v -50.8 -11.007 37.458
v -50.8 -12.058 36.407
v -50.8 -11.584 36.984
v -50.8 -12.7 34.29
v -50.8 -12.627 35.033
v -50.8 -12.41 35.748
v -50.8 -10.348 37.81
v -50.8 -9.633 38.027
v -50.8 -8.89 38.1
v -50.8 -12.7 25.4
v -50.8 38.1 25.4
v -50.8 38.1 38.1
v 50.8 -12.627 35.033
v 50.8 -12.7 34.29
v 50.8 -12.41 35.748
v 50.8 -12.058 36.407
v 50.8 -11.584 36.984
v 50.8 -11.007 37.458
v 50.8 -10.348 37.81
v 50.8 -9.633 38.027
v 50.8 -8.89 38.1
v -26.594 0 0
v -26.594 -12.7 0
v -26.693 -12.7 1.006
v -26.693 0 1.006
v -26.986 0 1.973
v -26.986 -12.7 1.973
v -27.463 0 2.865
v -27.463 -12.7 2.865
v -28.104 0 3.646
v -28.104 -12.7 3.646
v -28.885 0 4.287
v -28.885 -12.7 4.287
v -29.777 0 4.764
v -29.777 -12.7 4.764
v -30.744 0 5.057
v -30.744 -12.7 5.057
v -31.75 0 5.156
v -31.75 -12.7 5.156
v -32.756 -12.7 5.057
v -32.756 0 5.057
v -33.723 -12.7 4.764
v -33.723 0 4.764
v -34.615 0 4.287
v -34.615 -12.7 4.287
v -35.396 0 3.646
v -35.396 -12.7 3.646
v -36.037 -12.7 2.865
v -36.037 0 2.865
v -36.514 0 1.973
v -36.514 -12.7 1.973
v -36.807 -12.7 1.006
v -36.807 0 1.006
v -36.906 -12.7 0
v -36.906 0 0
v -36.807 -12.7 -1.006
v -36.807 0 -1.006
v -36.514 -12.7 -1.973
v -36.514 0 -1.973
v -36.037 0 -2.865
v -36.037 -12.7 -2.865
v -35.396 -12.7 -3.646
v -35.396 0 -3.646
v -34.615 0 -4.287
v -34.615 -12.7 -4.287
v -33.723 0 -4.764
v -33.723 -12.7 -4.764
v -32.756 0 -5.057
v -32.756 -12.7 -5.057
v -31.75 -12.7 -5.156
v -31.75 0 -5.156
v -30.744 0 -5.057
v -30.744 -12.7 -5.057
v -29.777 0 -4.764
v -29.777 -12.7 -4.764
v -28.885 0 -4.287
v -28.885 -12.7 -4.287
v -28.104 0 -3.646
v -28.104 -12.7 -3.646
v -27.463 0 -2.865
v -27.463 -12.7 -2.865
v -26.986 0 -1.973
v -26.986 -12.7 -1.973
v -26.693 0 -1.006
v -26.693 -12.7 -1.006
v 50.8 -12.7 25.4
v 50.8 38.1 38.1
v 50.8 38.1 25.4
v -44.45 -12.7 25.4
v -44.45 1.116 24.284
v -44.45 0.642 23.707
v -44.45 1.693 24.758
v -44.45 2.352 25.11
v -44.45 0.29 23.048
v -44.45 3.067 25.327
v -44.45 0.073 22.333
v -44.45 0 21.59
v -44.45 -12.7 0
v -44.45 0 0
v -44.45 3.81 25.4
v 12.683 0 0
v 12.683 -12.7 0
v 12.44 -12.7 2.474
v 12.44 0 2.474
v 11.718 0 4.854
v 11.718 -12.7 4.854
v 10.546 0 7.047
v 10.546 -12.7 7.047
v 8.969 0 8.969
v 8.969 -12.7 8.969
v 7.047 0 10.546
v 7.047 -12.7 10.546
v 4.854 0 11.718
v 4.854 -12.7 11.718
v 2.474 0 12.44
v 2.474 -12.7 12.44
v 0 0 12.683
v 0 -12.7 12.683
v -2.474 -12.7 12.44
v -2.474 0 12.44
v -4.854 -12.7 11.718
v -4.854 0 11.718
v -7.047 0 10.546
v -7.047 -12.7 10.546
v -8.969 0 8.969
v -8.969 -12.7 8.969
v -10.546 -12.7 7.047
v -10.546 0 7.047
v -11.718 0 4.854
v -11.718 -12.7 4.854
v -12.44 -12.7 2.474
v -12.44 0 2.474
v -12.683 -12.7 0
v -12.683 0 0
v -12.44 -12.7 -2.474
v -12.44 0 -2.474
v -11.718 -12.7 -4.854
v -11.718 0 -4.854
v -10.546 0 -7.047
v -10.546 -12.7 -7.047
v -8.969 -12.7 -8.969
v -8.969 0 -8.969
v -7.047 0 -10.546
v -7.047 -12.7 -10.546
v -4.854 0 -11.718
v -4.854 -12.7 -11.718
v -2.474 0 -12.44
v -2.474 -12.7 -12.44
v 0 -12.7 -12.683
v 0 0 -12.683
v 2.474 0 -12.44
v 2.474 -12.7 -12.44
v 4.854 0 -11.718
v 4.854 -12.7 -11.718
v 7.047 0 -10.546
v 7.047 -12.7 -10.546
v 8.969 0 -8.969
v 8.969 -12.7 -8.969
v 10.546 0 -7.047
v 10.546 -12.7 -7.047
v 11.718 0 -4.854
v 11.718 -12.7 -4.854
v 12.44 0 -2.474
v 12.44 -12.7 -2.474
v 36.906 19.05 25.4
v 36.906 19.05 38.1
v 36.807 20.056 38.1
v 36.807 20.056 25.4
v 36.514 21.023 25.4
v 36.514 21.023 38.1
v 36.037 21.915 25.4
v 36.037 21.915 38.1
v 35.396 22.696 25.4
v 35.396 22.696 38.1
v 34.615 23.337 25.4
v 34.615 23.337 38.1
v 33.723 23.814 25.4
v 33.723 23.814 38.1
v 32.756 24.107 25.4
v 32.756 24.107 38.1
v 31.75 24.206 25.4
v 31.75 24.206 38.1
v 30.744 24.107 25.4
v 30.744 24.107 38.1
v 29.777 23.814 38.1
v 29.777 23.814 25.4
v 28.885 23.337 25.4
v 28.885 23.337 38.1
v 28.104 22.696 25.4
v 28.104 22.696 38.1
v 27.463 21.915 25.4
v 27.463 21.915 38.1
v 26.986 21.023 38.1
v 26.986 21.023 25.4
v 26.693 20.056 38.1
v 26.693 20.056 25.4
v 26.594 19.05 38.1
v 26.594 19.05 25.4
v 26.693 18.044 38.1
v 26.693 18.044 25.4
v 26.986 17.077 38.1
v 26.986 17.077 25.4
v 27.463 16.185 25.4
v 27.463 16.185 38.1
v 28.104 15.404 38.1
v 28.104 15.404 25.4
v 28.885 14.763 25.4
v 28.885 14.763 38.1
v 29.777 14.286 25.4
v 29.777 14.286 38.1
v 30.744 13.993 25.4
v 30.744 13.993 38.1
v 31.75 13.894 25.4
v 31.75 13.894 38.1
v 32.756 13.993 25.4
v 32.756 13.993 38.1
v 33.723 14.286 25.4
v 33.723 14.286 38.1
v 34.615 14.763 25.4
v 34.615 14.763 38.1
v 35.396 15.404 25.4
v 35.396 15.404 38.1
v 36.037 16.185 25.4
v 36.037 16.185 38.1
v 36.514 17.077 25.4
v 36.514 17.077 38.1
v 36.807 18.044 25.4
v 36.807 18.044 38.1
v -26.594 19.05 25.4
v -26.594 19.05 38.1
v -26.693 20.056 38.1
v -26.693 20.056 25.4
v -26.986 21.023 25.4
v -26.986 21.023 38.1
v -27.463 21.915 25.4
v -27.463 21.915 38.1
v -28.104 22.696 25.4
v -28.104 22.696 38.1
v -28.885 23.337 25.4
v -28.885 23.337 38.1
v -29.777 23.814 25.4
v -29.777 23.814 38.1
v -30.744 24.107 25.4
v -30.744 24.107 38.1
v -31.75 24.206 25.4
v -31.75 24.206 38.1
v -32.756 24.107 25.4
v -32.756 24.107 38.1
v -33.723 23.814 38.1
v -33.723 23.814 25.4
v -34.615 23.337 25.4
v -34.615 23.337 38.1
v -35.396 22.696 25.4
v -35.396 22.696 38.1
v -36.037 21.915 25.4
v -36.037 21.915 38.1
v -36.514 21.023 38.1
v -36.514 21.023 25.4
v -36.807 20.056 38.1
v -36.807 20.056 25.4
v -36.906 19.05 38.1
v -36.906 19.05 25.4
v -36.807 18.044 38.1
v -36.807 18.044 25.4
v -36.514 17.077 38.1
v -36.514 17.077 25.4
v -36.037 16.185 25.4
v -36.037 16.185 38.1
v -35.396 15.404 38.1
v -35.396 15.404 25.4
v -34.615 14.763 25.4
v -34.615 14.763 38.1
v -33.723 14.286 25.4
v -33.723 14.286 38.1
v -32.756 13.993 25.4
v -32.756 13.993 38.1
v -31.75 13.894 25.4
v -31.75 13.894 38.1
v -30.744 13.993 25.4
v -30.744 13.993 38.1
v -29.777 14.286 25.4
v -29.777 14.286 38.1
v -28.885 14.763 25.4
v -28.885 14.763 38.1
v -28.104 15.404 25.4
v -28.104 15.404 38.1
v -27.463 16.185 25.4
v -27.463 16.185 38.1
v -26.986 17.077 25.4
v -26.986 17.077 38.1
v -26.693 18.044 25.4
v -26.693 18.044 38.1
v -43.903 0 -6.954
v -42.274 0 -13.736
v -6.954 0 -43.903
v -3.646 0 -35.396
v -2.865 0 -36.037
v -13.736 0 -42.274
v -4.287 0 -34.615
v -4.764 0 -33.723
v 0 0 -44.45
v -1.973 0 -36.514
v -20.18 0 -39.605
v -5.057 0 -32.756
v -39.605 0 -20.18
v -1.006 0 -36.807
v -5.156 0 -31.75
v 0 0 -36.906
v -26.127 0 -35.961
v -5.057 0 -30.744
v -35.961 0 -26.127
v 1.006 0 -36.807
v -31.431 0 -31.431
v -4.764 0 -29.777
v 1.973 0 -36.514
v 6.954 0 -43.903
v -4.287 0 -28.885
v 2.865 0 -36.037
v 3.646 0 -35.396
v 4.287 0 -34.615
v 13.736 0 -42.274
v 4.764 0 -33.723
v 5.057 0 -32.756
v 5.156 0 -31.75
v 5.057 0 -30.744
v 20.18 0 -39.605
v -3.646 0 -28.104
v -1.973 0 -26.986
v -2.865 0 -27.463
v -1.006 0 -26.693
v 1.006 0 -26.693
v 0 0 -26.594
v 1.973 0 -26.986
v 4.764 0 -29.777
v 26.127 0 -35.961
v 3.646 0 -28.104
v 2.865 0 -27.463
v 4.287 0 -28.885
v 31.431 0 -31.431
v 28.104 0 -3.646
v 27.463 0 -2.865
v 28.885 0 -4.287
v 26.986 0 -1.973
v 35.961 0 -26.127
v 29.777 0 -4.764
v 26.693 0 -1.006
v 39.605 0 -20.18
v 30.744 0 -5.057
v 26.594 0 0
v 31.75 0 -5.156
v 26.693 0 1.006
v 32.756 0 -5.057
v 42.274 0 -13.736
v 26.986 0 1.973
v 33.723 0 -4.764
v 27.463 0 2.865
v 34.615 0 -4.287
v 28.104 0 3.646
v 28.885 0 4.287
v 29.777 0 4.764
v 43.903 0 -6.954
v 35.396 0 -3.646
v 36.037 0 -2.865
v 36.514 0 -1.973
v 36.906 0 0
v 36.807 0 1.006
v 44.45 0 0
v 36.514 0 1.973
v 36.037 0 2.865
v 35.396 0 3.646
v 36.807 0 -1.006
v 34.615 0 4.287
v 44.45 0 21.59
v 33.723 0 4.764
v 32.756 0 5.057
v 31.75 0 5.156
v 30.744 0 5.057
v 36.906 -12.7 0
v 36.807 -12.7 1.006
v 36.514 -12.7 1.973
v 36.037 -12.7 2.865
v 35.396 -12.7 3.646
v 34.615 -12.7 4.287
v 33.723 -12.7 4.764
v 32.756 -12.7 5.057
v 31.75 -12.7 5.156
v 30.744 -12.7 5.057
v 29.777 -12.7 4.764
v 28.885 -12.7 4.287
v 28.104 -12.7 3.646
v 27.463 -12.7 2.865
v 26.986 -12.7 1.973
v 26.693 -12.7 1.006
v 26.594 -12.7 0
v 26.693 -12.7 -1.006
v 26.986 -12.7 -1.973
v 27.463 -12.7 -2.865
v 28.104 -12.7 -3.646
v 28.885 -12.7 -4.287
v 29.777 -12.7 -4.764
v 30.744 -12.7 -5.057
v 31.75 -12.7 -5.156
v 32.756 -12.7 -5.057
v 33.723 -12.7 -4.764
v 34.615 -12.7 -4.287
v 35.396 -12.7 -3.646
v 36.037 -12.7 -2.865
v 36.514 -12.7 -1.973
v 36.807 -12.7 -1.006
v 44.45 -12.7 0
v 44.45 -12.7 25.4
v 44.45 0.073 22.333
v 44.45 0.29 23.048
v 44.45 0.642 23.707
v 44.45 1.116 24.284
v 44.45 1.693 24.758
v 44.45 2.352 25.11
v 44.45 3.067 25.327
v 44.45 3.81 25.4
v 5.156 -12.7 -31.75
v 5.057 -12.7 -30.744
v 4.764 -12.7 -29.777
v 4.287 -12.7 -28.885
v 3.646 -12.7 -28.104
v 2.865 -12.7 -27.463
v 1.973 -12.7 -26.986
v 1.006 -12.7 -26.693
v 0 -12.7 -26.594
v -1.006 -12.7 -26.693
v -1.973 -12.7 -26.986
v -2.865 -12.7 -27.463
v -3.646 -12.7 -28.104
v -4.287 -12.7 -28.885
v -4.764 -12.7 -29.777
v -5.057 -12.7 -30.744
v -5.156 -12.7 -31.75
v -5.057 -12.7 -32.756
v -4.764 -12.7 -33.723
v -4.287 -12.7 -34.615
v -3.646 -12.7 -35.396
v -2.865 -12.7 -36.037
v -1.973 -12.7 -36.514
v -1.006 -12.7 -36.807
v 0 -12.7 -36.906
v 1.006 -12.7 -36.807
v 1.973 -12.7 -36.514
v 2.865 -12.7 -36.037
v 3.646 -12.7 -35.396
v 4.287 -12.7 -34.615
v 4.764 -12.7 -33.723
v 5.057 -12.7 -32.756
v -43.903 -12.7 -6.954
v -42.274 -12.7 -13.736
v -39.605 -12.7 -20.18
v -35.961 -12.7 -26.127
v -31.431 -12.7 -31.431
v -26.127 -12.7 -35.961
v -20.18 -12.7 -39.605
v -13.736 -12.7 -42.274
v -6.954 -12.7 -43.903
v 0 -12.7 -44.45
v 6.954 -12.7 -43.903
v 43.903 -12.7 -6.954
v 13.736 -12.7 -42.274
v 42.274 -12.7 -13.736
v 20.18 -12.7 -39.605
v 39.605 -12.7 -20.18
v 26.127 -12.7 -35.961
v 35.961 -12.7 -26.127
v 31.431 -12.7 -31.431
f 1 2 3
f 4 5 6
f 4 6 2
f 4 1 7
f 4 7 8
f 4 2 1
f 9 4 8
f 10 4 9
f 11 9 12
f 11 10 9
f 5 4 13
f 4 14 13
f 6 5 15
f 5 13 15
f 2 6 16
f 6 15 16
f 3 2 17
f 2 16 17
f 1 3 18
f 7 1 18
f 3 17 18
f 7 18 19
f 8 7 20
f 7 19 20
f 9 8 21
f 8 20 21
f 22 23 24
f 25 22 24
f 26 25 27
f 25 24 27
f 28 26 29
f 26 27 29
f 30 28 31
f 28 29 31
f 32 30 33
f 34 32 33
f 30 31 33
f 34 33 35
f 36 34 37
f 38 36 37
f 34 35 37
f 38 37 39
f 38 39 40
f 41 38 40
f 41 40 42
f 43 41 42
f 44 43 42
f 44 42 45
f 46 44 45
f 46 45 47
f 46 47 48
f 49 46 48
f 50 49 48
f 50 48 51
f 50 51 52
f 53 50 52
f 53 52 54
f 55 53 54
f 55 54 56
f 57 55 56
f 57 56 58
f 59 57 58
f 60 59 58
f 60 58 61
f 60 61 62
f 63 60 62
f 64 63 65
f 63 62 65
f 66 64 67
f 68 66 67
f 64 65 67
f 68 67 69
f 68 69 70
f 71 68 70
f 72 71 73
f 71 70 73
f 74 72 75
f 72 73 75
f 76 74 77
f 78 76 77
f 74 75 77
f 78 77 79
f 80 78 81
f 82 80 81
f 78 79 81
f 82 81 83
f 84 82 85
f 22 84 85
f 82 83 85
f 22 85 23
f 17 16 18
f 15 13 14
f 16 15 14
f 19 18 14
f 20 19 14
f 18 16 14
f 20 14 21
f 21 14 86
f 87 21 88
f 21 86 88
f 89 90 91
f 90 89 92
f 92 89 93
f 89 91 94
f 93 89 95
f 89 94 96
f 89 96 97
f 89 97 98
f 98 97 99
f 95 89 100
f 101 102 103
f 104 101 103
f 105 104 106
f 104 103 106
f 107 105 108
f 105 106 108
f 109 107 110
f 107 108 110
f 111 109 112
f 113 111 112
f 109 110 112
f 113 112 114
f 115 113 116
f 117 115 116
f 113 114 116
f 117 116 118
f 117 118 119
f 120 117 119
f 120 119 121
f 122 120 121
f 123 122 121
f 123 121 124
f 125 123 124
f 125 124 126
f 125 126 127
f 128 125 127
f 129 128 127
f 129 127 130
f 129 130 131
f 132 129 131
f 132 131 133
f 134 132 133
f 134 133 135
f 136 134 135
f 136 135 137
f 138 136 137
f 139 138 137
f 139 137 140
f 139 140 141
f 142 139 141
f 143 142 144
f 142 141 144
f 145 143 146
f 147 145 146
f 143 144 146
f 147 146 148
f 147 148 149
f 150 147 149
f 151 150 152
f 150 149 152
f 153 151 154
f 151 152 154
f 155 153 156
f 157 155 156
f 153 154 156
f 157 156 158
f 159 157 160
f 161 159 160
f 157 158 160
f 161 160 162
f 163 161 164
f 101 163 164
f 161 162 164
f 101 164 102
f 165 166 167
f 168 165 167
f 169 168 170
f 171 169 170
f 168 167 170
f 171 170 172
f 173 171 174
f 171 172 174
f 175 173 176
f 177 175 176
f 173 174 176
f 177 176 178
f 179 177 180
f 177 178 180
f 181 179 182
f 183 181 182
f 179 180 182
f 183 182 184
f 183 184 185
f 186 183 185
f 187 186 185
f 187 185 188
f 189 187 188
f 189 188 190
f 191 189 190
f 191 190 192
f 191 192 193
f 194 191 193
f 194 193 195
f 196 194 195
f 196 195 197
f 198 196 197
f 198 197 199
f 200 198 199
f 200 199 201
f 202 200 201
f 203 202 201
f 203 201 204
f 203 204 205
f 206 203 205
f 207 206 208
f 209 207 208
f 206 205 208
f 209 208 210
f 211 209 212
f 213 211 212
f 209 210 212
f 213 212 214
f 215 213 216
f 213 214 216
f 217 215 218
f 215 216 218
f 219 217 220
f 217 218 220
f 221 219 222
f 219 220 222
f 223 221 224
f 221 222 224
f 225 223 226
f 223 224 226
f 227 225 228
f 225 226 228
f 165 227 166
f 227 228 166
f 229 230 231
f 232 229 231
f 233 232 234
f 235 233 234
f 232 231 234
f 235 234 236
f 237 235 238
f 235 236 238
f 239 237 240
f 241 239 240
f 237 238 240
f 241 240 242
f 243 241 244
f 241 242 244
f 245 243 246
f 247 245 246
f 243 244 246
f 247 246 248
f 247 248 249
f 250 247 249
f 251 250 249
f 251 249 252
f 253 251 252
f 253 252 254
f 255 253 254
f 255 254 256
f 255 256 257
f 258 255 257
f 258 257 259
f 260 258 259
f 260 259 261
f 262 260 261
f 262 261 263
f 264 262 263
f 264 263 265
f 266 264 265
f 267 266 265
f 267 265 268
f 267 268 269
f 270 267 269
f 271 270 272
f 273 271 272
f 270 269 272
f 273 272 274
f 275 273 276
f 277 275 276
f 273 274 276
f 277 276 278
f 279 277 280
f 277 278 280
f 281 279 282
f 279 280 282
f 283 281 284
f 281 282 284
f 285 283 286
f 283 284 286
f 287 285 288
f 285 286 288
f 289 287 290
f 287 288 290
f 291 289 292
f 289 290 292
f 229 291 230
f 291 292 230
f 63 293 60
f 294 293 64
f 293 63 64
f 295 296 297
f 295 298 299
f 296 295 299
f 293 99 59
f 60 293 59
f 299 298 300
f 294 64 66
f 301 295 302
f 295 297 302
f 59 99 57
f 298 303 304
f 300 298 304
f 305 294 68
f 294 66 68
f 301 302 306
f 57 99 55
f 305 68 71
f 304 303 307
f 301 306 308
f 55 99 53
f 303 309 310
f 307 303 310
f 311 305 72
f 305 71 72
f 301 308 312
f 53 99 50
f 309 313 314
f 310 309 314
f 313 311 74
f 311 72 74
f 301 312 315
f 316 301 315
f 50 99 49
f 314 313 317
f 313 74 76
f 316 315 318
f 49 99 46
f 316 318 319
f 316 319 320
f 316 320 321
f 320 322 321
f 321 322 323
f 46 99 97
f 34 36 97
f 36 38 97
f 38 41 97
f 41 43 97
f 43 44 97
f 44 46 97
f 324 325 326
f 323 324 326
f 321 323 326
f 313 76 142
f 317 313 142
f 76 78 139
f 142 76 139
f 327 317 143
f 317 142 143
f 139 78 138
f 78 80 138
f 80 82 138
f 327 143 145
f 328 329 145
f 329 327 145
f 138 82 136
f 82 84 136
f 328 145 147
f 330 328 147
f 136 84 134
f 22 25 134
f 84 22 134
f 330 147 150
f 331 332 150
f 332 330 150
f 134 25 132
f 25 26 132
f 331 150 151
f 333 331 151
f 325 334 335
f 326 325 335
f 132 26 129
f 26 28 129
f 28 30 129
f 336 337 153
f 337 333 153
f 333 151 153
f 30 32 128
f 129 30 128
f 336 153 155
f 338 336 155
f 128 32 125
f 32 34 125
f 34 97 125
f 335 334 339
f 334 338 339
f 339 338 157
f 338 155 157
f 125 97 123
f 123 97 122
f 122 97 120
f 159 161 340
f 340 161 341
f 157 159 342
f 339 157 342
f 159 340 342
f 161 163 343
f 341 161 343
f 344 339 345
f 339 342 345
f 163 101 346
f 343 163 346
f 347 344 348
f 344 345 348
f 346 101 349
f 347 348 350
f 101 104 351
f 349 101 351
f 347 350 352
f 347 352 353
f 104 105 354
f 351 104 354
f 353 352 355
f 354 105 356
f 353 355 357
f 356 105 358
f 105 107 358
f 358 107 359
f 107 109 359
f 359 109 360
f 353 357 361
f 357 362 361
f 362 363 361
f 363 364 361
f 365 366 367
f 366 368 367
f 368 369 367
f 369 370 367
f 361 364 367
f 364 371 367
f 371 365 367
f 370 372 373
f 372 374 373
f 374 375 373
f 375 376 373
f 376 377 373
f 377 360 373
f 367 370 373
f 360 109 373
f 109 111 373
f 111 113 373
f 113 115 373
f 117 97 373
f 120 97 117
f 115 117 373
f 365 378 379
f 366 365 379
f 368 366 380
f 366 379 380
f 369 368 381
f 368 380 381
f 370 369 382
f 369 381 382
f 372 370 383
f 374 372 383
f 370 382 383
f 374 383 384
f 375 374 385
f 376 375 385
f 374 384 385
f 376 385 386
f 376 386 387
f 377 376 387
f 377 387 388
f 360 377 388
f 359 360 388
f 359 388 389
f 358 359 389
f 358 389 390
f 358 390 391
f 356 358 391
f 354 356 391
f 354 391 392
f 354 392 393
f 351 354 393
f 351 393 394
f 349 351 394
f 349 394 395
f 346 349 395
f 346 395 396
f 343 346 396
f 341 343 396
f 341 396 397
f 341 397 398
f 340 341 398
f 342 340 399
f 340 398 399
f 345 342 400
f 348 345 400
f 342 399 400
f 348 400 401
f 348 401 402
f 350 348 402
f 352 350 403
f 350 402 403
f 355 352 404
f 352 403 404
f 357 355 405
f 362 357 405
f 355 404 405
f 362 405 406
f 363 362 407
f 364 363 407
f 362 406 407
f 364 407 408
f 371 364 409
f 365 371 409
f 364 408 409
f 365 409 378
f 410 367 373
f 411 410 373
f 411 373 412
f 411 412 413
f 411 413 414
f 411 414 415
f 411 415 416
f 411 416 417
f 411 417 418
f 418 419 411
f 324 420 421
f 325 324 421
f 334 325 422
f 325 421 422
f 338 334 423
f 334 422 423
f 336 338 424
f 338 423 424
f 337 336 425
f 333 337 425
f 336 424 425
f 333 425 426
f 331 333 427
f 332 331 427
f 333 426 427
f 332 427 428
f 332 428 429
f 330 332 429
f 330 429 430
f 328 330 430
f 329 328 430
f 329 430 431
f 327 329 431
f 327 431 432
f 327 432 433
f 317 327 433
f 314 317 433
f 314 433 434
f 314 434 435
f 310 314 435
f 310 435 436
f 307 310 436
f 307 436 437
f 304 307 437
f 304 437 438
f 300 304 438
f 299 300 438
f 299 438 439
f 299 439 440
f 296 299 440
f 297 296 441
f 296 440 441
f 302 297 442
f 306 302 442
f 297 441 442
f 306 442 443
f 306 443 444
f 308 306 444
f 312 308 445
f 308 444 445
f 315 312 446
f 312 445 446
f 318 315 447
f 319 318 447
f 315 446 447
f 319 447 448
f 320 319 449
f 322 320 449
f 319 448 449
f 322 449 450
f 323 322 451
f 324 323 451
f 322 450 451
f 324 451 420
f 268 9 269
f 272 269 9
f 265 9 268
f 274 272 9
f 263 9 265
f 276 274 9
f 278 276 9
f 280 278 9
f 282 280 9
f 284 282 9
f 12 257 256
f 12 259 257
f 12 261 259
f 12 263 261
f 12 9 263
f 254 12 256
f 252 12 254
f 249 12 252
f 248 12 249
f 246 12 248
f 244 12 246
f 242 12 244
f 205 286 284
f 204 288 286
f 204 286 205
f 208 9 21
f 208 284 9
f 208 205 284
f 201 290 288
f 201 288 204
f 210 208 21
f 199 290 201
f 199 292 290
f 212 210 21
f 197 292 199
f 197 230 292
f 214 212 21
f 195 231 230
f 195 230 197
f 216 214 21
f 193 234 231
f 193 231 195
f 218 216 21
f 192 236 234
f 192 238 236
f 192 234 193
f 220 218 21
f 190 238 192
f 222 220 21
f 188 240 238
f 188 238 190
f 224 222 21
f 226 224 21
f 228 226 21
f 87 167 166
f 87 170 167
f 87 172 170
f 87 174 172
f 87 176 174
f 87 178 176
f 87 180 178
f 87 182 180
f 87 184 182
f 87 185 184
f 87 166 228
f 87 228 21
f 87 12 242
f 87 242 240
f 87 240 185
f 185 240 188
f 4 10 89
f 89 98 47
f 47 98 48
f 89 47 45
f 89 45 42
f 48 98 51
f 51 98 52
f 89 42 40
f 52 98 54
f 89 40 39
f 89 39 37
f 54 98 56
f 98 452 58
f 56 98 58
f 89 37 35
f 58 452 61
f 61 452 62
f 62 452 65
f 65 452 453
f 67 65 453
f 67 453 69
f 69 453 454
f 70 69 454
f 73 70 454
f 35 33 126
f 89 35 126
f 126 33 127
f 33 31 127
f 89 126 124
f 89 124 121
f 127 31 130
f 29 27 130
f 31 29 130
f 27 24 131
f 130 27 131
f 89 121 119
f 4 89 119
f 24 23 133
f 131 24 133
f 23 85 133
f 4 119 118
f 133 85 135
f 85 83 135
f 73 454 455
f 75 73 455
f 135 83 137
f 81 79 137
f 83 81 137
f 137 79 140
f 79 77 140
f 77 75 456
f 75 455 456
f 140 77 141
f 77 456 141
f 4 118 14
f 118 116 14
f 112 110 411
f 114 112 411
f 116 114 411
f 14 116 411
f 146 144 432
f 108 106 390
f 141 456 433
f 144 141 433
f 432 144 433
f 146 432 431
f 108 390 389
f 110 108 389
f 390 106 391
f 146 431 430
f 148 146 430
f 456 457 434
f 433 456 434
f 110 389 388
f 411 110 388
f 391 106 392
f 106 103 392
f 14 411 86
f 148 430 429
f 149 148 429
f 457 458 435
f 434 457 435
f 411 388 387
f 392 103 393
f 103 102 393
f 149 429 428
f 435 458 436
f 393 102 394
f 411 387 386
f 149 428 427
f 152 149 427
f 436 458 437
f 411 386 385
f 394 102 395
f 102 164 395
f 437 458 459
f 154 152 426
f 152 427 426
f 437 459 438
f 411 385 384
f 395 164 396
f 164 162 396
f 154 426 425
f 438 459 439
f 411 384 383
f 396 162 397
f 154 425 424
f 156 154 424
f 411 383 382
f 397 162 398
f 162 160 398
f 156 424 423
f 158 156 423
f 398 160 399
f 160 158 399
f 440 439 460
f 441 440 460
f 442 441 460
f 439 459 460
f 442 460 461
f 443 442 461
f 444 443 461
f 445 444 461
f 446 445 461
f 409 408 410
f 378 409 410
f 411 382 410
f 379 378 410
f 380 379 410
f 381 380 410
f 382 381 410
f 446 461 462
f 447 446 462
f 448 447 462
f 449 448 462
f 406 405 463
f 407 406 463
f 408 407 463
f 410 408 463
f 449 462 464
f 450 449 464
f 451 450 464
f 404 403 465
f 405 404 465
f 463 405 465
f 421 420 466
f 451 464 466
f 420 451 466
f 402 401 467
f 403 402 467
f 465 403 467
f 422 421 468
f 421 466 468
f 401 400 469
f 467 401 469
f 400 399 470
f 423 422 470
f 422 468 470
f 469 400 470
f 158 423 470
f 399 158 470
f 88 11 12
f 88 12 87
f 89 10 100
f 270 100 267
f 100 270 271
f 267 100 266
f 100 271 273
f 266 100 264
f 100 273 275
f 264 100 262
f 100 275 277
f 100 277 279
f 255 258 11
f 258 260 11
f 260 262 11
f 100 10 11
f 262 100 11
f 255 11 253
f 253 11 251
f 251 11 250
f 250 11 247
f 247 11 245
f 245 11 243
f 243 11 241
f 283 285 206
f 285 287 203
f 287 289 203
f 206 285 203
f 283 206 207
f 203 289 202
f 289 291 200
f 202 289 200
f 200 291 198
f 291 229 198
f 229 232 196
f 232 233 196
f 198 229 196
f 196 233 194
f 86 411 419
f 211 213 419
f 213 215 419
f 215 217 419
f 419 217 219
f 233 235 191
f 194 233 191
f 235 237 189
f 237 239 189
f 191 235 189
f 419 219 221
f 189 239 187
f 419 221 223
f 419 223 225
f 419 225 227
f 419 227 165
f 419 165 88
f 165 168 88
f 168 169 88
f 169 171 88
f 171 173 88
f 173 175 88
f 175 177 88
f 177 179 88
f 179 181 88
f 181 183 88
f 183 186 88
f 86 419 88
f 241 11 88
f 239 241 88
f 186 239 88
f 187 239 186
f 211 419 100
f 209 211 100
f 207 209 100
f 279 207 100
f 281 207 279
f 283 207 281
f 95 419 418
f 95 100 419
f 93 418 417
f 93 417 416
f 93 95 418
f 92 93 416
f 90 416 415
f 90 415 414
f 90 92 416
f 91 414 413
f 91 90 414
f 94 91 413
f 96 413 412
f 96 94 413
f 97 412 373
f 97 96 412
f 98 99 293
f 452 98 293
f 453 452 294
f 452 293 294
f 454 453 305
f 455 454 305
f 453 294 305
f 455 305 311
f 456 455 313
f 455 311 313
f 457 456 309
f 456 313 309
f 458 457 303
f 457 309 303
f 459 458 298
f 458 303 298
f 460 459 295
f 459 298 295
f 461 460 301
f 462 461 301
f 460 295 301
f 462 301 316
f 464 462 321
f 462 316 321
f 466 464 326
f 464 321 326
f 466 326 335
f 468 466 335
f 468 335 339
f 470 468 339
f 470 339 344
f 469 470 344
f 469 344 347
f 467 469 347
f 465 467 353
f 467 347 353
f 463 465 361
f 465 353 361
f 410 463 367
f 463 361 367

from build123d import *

# Parameters (mm, degrees)
F1_DEPTH = 12.7
F2_W     = 101.6
F2_H     = 50.8
F3_DEPTH = 12.7
F4_R     = 12.68349
F5_DEPTH = 25.4
F6_R     = 5.1562
F7_DEPTH = 25.4
F8_R     = 5.1562
F9_DEPTH = 25.4
F10_R    = 3.81


with BuildPart() as f1:
    # F0 (on Front) → F1 (new body)
    with BuildSketch(Plane.XZ):
        with BuildLine():
            Line((-44.45, 25.4), (-44.45, 0))
            ThreePointArc((-44.45, 0), (0, -44.45), (44.45, 0))
            Line((44.45, 0), (44.45, 25.4))
            Line((44.45, 25.4), (-44.45, 25.4))
        make_face()
    extrude(amount=F1_DEPTH)

    # F2 (on face) → F3 (join)
    with BuildSketch(Plane.XY.offset(25.4)):
        with Locations((0, 12.7)):
            Rectangle(F2_W, F2_H)
    extrude(amount=F3_DEPTH)

    # F4 (on face) → F5 (cut)
    with BuildSketch(Plane.XZ.offset(12.7)):
        Circle(F4_R)
    extrude(amount=-F5_DEPTH, mode=Mode.SUBTRACT)

    # F6 (on face) → F7 (cut)
    with BuildSketch(Plane.XZ.offset(12.7)):
        with Locations((0, -31.75)):
            Circle(F6_R)
        with Locations((-31.75, 0)):
            Circle(F6_R)
        with Locations((31.75, 0)):
            Circle(F6_R)
    extrude(amount=-F7_DEPTH, mode=Mode.SUBTRACT)

    # F8 (on face) → F9 (cut)
    with BuildSketch(Plane.XY.offset(38.1)):
        with Locations((-31.75, 19.05)):
            Circle(F8_R)
        with Locations((31.75, 19.05)):
            Circle(F8_R)
    extrude(amount=-F9_DEPTH, mode=Mode.SUBTRACT)

    # F10
    f10_edges = [f1.edges().sort_by_distance(p)[0] for p in [
        (0, 0, 25.4),
        (0, -12.7, 38.1),
    ]]
    fillet(f10_edges, radius=F10_R)


solid = f1.part
